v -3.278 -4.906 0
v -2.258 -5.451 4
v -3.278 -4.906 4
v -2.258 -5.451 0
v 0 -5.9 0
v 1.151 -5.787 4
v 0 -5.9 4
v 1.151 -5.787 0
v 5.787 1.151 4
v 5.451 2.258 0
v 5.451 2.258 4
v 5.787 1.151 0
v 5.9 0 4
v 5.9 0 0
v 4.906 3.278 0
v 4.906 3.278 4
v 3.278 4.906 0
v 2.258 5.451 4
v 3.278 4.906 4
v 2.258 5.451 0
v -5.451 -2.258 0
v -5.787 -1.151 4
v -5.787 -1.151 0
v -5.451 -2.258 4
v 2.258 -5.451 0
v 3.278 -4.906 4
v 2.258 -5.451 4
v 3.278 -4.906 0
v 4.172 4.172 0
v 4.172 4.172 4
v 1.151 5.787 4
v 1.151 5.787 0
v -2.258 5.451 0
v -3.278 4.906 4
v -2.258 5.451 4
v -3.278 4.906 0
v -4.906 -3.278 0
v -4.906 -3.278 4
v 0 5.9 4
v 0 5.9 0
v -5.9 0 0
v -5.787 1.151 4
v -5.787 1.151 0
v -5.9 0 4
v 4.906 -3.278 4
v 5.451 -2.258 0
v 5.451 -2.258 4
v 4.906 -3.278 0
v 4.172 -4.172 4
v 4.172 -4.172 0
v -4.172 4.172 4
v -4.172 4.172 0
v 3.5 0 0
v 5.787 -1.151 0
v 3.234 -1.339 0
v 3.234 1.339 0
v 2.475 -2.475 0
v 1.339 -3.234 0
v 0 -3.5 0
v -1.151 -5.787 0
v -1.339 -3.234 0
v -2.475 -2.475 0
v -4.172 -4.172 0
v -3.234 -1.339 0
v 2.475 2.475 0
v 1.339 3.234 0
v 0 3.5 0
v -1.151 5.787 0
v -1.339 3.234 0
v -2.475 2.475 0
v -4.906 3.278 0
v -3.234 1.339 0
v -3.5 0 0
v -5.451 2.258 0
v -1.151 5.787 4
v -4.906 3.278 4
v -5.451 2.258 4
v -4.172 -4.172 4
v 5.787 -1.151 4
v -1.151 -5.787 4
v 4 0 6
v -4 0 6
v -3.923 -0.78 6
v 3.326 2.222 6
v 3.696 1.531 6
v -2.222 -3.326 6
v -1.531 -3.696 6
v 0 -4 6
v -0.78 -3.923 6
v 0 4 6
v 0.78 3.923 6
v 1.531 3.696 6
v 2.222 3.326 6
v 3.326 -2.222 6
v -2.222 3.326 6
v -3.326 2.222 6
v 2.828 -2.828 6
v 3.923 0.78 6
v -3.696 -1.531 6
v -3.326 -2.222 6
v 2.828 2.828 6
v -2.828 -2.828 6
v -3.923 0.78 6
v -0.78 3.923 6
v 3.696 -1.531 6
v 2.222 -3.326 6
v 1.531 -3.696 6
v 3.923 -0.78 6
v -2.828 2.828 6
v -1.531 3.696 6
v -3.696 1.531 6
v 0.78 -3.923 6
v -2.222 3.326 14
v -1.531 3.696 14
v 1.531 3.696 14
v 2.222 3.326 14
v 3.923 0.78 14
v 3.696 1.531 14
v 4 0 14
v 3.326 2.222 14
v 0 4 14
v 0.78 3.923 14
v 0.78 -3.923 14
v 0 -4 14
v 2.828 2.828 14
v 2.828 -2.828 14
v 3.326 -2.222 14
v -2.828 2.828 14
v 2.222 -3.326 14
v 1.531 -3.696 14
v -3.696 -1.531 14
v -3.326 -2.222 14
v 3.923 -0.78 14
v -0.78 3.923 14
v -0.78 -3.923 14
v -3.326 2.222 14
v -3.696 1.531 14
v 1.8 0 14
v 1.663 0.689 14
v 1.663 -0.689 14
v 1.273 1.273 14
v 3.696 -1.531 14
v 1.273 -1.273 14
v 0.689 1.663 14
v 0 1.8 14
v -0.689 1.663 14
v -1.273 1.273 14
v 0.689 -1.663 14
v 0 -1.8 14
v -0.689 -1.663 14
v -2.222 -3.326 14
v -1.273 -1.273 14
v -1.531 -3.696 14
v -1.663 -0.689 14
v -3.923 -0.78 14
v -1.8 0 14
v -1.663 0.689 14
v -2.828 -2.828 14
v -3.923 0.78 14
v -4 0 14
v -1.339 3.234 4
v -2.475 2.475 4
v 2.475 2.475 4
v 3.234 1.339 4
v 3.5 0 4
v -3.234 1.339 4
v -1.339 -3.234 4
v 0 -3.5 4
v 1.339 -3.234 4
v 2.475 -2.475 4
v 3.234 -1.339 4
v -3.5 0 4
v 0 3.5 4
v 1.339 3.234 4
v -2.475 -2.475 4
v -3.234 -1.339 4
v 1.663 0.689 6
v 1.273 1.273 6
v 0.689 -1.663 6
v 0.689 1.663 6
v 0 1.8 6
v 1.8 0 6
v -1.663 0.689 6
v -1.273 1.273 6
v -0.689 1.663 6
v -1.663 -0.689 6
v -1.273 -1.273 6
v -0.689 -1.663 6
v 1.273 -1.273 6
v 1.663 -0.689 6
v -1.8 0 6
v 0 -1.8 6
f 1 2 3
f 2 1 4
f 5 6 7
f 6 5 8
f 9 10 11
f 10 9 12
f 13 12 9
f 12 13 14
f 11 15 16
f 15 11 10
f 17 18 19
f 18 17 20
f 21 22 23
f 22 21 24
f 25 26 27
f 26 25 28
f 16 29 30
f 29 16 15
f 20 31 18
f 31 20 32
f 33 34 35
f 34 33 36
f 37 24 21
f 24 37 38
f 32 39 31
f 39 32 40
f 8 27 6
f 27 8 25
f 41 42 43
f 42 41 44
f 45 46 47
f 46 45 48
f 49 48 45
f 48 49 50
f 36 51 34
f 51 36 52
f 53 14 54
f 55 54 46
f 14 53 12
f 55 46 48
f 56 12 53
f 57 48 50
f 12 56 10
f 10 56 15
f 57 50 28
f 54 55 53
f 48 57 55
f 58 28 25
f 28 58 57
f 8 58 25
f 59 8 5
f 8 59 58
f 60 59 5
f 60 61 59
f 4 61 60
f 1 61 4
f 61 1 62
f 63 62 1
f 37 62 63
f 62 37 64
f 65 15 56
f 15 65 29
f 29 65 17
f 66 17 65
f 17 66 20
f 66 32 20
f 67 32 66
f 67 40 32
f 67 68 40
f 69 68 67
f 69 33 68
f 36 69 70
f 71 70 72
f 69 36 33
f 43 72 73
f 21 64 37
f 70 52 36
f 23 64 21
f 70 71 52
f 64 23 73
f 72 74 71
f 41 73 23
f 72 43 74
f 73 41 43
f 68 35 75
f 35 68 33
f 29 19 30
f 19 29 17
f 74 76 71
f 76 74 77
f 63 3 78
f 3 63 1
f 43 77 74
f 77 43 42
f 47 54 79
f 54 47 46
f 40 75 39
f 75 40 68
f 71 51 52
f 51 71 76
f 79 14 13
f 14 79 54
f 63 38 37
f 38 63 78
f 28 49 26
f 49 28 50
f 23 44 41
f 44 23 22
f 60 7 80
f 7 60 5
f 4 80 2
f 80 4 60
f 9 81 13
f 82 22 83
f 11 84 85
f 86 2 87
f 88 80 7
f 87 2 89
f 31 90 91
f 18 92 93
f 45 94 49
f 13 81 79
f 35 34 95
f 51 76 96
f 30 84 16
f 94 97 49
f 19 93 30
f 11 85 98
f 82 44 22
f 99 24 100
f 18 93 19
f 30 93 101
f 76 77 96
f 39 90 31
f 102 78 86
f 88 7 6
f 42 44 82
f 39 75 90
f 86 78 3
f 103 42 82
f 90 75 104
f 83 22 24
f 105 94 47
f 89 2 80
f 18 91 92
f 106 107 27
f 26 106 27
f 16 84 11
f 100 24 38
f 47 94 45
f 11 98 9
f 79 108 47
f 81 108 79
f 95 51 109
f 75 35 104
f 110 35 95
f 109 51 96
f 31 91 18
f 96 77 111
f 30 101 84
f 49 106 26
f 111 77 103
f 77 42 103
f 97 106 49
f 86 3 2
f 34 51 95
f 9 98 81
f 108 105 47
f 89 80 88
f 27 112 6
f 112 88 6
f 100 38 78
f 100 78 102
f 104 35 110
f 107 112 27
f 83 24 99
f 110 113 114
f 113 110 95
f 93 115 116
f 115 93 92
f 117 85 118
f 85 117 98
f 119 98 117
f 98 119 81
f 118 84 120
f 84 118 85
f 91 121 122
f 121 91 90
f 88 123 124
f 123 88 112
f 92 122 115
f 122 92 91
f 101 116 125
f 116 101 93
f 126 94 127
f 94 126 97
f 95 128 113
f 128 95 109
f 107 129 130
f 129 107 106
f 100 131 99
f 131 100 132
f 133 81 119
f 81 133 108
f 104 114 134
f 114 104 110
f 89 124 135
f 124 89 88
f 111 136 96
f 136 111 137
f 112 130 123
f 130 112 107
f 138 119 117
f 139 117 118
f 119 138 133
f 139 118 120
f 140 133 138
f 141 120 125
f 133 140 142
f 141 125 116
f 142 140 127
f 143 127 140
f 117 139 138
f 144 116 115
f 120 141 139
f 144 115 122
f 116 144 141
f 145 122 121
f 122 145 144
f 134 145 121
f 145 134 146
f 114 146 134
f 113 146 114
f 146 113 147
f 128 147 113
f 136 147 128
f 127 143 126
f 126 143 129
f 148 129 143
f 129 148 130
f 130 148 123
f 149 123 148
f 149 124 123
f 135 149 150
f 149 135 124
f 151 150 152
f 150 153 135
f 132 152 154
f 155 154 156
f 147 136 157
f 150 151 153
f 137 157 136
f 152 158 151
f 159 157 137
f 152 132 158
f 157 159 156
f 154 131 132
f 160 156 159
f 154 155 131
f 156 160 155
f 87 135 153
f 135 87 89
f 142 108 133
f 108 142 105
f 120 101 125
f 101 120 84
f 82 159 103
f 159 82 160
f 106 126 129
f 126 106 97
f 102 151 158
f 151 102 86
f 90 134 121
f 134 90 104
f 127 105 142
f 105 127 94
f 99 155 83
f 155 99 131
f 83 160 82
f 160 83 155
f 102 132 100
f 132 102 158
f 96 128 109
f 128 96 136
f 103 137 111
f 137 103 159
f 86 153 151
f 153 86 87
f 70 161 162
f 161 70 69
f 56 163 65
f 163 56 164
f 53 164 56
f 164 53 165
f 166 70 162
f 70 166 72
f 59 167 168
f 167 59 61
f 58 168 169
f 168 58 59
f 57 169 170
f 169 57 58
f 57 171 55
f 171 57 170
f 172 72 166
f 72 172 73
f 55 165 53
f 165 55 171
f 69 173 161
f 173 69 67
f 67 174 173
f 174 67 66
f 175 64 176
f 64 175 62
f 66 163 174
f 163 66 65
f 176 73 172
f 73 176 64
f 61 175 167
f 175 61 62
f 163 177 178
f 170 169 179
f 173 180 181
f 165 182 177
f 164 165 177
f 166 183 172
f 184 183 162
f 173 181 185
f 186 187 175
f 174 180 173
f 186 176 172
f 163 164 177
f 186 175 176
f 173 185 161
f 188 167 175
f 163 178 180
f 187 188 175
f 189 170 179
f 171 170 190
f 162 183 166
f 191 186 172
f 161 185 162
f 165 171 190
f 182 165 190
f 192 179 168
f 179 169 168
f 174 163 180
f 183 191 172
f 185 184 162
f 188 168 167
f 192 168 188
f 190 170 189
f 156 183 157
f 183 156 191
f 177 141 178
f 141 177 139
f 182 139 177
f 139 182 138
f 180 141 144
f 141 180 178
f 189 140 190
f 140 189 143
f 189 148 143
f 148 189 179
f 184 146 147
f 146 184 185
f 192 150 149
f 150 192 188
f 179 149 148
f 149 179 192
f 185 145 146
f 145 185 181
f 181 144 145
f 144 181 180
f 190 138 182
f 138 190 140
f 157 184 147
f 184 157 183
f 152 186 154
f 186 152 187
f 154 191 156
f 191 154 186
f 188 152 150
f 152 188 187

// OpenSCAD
height=14;
nutHeight=4;
coneHeight=2;

nutDiameter=7;
holderDiameter=8;
screwM3Diameter=3.6;

holderFn=32;
screwFn=16;

wallThickness=2.4;

bottomDiameter=nutDiameter+2*wallThickness;

module main()
{
	cylinder(
		d=bottomDiameter,
		h=nutHeight,
		$fn=holderFn
	);
	
	translate([0,0,nutHeight])
	cylinder(
		d1=bottomDiameter,
		d2=holderDiameter,
		h=coneHeight,
		$fn=holderFn
	);
	
	cylinder(
		d=holderDiameter,
		h=height,
		$fn=holderFn
	);
}

module hole()
{
	translate([0,0,-1])
	cylinder(
		d=nutDiameter,
		h=nutHeight+1,
		$fn=screwFn
	);
	
	
	translate([0,0,nutHeight])
	cylinder(
		d1=nutDiameter,
		d2=screwM3Diameter,
		h=coneHeight,
		$fn=screwFn
	);
	
	translate([0,0,-1])
	cylinder(
		d=screwM3Diameter,
		h=height+2,
		$fn=screwFn
	);
}


difference()
{
	main();
	hole();
}
